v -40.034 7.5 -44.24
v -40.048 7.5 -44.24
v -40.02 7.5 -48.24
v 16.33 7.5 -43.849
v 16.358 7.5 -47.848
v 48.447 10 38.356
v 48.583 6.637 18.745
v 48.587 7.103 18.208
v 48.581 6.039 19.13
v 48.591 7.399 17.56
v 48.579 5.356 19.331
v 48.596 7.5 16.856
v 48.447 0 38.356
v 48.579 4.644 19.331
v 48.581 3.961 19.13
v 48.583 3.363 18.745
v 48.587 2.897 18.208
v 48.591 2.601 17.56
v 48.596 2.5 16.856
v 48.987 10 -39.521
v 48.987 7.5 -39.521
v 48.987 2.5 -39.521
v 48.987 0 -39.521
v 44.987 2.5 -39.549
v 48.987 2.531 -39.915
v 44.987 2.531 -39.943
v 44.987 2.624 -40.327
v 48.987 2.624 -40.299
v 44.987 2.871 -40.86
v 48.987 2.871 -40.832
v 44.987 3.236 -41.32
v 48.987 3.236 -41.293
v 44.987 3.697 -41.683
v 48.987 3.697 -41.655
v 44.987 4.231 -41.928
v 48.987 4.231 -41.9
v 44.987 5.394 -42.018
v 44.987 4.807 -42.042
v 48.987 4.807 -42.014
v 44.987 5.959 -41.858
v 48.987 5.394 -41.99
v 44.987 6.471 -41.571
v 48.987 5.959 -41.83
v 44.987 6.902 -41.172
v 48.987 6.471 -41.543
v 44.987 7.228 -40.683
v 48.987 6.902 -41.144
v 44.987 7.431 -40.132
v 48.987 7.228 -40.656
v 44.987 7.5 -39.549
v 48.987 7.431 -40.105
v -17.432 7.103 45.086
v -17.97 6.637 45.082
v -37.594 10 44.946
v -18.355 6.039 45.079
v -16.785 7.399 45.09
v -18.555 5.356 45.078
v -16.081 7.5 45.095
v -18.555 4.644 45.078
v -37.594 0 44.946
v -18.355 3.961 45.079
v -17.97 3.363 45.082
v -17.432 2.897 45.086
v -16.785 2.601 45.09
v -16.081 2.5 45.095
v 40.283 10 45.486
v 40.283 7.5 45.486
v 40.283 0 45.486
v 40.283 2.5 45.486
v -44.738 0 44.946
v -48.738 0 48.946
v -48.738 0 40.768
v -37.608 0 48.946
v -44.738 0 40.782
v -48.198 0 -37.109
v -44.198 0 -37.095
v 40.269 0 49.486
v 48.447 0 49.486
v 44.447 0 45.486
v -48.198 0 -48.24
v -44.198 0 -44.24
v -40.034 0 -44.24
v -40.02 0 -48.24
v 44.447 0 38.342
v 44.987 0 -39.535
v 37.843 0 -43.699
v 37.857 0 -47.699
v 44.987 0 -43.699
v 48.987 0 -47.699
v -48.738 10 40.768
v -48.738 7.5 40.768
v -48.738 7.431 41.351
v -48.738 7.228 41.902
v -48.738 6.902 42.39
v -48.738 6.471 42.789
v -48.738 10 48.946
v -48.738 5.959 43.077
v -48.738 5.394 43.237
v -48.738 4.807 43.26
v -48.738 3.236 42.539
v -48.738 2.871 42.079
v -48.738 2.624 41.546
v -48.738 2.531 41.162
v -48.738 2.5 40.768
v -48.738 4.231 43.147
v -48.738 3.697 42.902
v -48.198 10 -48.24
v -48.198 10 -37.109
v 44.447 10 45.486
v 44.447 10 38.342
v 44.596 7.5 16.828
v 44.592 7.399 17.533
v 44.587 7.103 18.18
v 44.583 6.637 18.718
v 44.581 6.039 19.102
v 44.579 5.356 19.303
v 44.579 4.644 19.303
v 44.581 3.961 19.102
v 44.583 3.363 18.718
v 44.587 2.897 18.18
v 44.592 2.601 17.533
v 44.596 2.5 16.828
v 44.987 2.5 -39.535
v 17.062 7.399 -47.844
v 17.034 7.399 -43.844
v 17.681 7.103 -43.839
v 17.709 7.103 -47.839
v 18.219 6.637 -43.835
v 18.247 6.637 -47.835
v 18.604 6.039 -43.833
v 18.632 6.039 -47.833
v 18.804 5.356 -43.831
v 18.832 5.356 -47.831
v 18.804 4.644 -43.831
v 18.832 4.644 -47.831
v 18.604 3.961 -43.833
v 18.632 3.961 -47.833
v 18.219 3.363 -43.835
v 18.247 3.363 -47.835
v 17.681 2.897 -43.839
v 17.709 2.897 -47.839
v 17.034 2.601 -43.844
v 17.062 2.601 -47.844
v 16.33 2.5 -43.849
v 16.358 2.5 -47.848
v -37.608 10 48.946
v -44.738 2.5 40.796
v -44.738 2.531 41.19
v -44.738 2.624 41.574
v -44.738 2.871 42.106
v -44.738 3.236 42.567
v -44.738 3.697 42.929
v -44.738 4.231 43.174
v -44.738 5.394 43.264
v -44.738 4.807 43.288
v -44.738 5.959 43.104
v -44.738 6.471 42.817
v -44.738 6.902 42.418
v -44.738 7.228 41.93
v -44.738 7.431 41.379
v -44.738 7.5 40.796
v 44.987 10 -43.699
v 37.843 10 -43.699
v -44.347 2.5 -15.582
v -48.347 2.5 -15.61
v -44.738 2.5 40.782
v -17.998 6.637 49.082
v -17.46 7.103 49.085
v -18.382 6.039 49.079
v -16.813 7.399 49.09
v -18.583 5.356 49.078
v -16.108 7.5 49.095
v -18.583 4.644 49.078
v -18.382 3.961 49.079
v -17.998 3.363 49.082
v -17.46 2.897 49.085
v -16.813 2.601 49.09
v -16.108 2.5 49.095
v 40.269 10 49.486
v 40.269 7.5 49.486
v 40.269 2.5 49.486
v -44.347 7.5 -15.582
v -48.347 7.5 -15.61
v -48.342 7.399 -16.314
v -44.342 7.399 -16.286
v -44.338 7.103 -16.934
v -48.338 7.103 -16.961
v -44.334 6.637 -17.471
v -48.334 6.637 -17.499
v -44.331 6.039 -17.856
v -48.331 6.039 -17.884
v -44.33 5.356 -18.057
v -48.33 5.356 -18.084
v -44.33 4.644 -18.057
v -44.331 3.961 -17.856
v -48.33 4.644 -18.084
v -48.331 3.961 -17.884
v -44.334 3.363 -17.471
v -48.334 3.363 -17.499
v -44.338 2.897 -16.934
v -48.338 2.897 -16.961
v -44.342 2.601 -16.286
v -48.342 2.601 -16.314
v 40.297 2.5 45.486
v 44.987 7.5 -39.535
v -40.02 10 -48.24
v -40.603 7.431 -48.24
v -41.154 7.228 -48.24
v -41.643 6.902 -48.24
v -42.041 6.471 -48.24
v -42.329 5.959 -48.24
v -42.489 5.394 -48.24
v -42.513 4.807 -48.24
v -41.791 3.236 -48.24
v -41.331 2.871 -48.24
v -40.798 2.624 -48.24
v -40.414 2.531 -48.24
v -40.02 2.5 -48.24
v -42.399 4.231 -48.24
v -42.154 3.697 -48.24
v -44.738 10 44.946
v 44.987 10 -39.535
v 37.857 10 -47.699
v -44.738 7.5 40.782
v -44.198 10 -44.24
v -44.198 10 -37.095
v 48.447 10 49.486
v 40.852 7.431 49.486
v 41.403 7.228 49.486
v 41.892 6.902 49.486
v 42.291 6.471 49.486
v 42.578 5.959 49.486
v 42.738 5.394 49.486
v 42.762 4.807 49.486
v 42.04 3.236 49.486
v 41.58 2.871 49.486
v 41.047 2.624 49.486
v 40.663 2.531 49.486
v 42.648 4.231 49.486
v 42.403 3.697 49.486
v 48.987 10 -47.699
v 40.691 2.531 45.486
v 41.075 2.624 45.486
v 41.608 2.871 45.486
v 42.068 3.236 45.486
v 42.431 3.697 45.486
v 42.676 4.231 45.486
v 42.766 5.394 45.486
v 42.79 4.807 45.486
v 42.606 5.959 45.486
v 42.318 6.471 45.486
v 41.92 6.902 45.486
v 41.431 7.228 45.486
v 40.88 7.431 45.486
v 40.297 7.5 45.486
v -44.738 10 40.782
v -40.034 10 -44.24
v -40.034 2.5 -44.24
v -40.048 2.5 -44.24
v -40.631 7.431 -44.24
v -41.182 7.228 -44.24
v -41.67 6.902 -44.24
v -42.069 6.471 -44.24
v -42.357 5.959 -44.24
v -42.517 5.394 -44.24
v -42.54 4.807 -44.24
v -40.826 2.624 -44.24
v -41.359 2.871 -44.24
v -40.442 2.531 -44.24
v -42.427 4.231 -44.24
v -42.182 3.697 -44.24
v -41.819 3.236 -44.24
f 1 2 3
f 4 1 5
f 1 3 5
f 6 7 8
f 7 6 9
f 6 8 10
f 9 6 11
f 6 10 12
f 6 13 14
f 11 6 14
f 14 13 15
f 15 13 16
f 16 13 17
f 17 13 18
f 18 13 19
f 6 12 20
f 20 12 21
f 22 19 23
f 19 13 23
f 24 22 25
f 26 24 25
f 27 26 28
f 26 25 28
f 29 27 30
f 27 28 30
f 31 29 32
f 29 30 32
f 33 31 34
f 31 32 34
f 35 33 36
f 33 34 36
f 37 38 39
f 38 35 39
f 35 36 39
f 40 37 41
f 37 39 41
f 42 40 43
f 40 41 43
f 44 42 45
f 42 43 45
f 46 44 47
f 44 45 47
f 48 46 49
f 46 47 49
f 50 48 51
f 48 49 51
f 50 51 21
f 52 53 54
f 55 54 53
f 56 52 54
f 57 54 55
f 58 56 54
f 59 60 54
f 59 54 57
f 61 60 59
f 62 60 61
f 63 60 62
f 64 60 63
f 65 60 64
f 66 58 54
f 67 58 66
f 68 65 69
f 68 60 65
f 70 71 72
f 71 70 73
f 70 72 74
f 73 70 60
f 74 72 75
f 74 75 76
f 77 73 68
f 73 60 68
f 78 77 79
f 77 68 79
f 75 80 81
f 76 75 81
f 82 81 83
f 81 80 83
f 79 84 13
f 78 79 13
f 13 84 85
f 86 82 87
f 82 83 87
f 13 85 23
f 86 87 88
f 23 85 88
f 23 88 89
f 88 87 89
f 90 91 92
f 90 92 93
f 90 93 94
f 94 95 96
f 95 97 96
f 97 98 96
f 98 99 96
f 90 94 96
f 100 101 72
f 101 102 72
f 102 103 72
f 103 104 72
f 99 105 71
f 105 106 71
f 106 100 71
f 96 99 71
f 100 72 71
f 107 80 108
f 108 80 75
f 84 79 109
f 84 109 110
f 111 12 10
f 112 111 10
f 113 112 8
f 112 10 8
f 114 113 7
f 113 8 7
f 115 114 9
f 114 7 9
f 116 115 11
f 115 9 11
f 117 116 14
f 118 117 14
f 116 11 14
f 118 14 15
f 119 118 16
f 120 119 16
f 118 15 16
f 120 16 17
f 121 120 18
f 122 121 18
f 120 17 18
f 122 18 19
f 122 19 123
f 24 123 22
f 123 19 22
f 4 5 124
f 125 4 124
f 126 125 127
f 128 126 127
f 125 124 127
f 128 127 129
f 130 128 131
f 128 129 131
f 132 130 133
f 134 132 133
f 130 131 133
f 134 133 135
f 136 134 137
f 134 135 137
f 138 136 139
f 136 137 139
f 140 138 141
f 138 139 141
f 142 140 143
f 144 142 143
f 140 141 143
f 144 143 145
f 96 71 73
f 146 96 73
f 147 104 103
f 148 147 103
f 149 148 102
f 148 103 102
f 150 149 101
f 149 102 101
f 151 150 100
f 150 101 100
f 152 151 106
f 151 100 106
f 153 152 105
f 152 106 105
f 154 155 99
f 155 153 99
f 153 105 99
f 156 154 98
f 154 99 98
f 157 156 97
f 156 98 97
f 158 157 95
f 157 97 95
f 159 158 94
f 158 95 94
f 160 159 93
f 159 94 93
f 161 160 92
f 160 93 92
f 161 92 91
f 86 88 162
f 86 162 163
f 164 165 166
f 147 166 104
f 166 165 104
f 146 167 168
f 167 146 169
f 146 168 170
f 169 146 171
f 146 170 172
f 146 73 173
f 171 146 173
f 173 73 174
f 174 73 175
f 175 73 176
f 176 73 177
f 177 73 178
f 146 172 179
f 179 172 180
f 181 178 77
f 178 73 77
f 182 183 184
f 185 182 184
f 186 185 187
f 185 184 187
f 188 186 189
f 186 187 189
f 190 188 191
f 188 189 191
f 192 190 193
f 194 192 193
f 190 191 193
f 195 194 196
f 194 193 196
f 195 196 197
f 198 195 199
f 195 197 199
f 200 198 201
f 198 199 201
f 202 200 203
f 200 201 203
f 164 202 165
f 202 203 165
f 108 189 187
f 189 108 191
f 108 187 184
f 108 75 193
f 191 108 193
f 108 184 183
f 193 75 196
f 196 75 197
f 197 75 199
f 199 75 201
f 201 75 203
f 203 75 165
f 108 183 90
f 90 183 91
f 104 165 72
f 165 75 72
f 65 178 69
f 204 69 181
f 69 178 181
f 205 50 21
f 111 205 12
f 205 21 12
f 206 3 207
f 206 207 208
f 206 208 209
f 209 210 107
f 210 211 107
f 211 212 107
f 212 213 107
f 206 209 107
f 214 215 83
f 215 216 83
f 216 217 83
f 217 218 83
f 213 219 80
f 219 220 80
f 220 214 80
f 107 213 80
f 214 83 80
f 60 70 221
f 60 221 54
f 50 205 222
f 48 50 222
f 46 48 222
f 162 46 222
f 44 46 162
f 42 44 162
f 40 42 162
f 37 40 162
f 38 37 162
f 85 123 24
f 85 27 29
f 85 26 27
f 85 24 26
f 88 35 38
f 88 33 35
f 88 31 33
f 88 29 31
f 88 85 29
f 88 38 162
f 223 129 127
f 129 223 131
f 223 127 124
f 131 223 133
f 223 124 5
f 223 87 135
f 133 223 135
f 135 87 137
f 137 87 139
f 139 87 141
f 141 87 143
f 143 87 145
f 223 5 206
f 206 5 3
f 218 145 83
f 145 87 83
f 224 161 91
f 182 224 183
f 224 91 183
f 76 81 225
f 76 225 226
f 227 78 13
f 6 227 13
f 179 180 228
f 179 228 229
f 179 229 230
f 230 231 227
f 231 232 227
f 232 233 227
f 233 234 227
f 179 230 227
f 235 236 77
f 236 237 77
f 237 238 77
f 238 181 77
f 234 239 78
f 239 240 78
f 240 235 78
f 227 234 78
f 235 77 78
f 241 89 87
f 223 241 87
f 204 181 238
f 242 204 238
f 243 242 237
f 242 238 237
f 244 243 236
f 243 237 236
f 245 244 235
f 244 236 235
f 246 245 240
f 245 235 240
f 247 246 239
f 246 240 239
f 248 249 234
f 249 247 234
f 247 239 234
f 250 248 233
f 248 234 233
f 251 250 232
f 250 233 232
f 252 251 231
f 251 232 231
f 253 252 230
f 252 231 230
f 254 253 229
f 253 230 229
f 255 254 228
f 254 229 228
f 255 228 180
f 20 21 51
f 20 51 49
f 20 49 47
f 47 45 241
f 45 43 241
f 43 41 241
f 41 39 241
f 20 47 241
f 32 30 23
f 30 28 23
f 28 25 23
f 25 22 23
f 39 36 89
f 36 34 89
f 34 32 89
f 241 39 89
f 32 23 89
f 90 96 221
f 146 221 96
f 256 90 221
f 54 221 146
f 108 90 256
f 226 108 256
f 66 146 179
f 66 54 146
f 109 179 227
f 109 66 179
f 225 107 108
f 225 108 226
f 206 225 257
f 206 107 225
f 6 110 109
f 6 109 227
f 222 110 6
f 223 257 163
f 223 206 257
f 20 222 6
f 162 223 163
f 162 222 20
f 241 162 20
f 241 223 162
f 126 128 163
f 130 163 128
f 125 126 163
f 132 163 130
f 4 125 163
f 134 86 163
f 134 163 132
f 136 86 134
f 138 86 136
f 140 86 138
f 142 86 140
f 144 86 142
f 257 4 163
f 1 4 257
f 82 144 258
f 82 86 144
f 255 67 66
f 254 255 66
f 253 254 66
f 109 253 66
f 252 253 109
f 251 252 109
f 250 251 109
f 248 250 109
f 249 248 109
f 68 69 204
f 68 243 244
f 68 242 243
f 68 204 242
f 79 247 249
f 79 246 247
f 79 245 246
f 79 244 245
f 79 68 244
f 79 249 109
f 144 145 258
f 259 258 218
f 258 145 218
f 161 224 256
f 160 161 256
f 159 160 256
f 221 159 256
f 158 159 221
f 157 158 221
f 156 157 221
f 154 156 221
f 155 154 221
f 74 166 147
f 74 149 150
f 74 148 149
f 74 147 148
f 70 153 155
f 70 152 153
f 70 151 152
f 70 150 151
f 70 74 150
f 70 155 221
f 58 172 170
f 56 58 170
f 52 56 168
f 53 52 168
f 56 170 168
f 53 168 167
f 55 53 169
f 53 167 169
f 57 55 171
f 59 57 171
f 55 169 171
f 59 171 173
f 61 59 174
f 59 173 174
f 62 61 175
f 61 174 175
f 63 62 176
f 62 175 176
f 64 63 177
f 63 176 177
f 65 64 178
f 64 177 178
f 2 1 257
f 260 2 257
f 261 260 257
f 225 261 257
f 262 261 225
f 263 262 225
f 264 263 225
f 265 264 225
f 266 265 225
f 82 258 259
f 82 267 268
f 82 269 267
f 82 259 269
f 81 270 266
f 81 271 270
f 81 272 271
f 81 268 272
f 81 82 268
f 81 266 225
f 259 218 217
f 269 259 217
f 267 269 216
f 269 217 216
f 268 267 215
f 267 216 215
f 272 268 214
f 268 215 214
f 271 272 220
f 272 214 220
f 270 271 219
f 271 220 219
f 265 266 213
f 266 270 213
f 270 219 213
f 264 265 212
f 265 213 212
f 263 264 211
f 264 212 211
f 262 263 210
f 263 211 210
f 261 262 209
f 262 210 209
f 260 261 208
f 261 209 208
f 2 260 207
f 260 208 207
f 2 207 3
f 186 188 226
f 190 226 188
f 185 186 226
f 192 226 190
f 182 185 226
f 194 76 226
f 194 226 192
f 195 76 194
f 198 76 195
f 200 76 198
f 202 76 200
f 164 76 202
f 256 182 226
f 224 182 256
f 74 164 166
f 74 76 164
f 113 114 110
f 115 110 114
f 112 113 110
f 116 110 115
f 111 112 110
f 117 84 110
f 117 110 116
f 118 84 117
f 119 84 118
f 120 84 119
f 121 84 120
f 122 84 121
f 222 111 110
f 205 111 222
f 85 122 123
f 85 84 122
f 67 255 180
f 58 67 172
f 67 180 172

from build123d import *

# Parameters (mm, degrees)
BOSS_EXTRUDE1_DEPTH = 10
SKETCH2_R           = 2.5
CUT_EXTRUDE1_DEPTH  = 10
CIRPATTERN2_COUNT   = 4
CUT_EXTRUDE2_START  = 1
CUT_EXTRUDE2_DEPTH  = 6
CIRPATTERN3_COUNT   = 4


with BuildPart() as part:
    # Sketch1 → Boss-Extrude1 (new body)
    with BuildSketch(Plane(origin=(0, 0, 0), x_dir=(1, 0, 0), z_dir=(0, 1, 0))):
        Polygon((-48.197888799, 37.109268565), (-48.738098109, -40.767831949), (-48.738098109, -48.945710496), (-37.607816364, -48.945710496), (40.26928415, -49.485919806), (48.447162698, -49.485919806), (48.447162698, -38.355638061), (48.987372008, 39.521462453), (48.987372008, 47.699341001), (37.857090263, 47.699341001), (-40.020010251, 48.239550311), (-48.197888799, 48.239550311), align=None)
        Polygon((-40.033883465, 44.239550311), (-44.197888799, 44.239550311), (-44.197888799, 37.095395352), (-44.738098109, -40.781705162), (-44.738098109, -44.945710496), (-37.59394315, -44.945710496), (40.283157364, -45.485919806), (44.447162698, -45.485919806), (44.447162698, -38.341764848), (44.987372008, 39.535335666), (44.987372008, 43.699341001), (37.843217049, 43.699341001), align=None, mode=Mode.SUBTRACT)
    extrude(amount=BOSS_EXTRUDE1_DEPTH)

    # Sketch2 → Cut-Extrude1 (cut)
    with BuildSketch(Plane(origin=(0.332681132, 0, -47.959636197), x_dir=(-0.999975942033621, 0, -0.006936523190502626), z_dir=(0.006936523190502627, 0, -0.9999759420336211))):
        with Locations(Location((40.353662211, 5, 0), (0, 0, 270))):
            Circle(SKETCH2_R)
    cut_extrude1 = extrude(amount=-CUT_EXTRUDE1_DEPTH, mode=Mode.SUBTRACT)

    # CirPattern2: Cut-Extrude1 ×4 about axis
    cirpattern2_axis = Axis((0.12463695, 10, 0.623184748), (0, -1, 0))
    for i in range(1, CIRPATTERN2_COUNT):
        add(cut_extrude1.rotate(cirpattern2_axis, i * 360 / CIRPATTERN2_COUNT), mode=Mode.SUBTRACT)

    # Sketch6 → Cut-Extrude2 (cut)
    with BuildSketch(Plane(origin=(-0.341314401, 0, 49.20421667), x_dir=(0.999975942033621, 0, 0.006936523190502982), z_dir=(-0.006936523190502983, 0, 0.9999759420336211)).offset(CUT_EXTRUDE2_START)):
        with BuildLine():
            Line((40.611575584, 7.5), (-15.76739854, 7.5))
            ThreePointArc((-15.76739854, 7.5), (-18.26739854, 5), (-15.76739854, 2.5))
            Line((-15.76739854, 2.5), (40.611575584, 2.5))
            ThreePointArc((40.611575584, 2.5), (43.111575584, 5), (40.611575584, 7.5))
        make_face()
    cut_extrude2 = extrude(amount=-CUT_EXTRUDE2_DEPTH, mode=Mode.SUBTRACT)

    # CirPattern3: Cut-Extrude2 ×4 about axis
    cirpattern3_axis = Axis((0.12463695, 10, 0.623184748), (0, -1, 0))
    for i in range(1, CIRPATTERN3_COUNT):
        add(cut_extrude2.rotate(cirpattern3_axis, i * 360 / CIRPATTERN3_COUNT), mode=Mode.SUBTRACT)


solid = part.part
